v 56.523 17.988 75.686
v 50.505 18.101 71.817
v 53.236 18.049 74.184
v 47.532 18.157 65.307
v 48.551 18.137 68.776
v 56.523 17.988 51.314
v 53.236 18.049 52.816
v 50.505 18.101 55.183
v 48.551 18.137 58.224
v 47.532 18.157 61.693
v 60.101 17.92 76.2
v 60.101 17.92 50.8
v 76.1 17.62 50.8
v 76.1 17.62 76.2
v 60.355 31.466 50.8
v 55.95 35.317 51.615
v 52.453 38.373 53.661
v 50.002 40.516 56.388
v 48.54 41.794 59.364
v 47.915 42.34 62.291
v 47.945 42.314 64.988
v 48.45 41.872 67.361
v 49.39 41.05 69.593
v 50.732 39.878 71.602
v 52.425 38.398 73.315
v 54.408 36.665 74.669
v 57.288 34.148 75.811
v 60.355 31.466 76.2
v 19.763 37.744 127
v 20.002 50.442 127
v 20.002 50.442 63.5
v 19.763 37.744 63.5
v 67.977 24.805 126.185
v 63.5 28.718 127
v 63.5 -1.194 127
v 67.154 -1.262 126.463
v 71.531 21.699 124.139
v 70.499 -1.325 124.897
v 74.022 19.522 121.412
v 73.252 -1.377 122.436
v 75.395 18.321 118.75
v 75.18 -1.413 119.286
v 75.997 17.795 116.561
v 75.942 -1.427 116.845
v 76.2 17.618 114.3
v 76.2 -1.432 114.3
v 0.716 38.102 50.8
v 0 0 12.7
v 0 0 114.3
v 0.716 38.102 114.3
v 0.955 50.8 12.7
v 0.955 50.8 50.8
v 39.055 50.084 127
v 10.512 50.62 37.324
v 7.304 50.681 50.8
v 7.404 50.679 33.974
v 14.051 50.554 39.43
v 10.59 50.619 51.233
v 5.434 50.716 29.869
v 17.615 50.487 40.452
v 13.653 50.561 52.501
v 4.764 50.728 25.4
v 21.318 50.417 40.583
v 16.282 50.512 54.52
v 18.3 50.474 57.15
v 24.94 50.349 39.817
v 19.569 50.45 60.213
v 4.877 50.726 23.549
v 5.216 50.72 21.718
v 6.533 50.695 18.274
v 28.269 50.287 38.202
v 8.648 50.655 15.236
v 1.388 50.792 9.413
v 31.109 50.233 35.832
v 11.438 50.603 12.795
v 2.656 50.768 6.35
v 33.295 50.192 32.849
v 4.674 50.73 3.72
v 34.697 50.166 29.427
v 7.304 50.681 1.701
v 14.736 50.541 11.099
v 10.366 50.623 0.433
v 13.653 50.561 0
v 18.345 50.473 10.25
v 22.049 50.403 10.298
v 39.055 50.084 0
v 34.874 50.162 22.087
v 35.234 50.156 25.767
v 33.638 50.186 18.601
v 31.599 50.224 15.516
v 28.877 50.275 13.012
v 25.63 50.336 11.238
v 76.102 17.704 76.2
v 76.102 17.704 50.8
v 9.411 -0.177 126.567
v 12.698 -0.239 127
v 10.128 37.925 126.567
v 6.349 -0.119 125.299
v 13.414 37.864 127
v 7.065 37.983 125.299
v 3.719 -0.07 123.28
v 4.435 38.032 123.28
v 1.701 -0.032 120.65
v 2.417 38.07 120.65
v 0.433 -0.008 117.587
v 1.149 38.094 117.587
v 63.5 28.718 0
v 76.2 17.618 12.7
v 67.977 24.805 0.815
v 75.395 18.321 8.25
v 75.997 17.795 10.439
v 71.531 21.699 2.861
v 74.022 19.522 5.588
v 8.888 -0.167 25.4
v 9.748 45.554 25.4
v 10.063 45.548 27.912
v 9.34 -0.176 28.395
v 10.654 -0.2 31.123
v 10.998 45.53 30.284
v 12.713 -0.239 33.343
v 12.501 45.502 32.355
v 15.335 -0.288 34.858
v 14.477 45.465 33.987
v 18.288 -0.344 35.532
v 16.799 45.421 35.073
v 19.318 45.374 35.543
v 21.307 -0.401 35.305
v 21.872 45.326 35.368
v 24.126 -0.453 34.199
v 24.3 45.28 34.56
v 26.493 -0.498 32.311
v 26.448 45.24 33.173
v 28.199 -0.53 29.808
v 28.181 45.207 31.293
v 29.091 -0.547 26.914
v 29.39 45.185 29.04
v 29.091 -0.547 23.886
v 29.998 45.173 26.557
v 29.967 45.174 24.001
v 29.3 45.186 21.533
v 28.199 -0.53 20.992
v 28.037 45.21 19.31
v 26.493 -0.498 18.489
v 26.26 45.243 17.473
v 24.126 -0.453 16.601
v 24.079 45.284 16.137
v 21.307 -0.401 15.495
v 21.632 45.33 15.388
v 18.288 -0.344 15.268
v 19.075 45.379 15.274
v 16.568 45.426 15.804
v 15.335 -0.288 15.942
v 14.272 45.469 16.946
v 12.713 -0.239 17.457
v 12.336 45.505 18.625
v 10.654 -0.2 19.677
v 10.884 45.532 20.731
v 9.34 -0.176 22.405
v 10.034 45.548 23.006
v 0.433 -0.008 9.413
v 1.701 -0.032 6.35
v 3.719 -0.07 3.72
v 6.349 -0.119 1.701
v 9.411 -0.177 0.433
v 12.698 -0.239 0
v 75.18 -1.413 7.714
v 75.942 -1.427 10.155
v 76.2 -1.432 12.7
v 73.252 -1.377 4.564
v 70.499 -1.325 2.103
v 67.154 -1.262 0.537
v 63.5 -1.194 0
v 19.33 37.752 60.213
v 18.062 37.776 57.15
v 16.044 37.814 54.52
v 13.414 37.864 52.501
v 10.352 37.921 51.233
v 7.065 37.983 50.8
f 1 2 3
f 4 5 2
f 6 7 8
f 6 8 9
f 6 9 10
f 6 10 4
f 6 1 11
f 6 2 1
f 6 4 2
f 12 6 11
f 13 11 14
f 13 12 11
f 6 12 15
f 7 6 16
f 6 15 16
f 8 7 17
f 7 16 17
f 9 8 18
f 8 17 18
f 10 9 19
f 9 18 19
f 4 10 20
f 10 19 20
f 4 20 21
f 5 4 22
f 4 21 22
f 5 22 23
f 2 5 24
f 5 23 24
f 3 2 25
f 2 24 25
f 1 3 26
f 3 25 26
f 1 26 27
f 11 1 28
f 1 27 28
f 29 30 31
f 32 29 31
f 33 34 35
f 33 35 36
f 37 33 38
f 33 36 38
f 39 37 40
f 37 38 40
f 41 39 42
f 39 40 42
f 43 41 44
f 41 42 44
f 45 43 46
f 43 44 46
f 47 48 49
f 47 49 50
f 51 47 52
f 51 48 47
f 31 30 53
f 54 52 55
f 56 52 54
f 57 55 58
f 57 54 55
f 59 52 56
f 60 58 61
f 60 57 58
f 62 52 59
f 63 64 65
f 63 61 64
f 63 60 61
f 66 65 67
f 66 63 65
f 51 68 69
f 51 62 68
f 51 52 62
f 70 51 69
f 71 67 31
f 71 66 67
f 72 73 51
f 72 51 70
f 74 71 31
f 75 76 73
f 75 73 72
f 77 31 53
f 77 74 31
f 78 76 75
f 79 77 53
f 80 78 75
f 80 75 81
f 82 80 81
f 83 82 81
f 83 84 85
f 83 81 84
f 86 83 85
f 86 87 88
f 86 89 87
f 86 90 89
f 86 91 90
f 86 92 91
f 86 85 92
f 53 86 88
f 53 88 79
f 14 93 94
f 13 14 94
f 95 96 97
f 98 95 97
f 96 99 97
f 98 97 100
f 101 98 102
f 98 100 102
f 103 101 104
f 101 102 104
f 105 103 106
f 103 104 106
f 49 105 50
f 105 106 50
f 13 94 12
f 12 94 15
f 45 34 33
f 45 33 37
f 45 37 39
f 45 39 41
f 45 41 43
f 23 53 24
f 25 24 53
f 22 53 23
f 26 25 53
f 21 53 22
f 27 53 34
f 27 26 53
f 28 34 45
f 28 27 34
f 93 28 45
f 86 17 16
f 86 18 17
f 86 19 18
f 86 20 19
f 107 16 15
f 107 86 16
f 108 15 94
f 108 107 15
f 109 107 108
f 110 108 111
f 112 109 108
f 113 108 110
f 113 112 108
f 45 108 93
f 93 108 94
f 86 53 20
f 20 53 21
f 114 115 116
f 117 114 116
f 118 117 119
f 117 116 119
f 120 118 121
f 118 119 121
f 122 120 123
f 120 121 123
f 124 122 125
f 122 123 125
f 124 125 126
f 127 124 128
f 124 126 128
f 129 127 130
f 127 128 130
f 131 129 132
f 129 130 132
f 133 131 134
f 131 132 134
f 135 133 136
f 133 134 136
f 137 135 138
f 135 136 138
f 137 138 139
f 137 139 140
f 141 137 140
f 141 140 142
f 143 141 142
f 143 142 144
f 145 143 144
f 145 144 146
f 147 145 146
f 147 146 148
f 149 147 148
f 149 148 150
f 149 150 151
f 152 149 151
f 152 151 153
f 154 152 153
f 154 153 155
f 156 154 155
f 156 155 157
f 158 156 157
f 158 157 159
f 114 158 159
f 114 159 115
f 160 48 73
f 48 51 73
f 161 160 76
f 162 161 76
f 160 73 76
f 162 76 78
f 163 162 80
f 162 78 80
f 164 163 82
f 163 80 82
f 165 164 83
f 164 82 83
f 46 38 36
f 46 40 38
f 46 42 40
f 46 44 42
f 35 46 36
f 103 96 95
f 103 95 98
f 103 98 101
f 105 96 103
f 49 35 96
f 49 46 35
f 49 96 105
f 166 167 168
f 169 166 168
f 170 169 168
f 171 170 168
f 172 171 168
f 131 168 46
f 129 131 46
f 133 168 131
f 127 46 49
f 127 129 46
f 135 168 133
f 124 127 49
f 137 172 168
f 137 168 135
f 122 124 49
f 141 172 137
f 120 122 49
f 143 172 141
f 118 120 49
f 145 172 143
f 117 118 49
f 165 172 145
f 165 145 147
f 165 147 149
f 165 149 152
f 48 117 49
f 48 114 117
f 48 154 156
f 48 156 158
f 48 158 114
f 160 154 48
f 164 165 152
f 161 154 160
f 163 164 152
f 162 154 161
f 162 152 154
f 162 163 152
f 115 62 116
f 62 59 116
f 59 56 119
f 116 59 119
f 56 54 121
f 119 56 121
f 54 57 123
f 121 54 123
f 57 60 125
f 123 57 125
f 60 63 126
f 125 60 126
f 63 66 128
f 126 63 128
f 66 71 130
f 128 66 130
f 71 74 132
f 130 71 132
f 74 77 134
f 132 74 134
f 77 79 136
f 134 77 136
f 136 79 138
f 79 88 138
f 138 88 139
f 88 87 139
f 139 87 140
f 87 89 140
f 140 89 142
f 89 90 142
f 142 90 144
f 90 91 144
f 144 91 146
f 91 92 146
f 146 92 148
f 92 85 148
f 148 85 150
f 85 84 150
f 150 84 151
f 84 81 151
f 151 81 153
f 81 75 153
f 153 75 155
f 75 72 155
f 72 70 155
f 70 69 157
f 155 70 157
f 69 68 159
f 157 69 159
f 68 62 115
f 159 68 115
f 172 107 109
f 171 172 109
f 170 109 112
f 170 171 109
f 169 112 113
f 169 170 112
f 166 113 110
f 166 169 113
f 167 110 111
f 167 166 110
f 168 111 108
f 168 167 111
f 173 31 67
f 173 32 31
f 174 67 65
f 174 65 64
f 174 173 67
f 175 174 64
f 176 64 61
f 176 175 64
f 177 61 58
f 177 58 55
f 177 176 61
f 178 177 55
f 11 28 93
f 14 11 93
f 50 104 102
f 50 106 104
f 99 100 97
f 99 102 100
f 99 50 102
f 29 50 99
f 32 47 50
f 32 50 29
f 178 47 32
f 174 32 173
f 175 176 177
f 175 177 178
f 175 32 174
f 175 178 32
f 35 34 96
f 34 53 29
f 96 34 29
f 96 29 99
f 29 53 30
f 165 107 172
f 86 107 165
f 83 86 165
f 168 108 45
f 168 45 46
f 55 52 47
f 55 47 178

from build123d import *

# Parameters (mm, degrees)
BOSS_EXTRUDE1_DEPTH = 127
SKETCH2_R           = 10.16
CUT_EXTRUDE1_DEPTH  = 157.585578439
CHAMFER1_SIZE       = 5.08
SKETCH3_W           = 19.05
SKETCH3_H           = 76.2
CUT_EXTRUDE2_DEPTH  = 12.7
FILLET1_R           = 12.7
CUT_EXTRUDE4_DEPTH  = 31.762338
FILLET2_R           = 12.7
FILLET3_R           = 12.7
FILLET4_R           = 12.7
FILLET5_R           = 12.7


with BuildPart() as part:
    # Sketch1 → Boss-Extrude1 (new body)
    with BuildSketch(Plane.XY):
        Polygon((0, 0), (0.954886233, 50.8), (39.054886233, 50.083835325), (76.2, 17.617670651), (76.2, -1.432329349), align=None)
    extrude(amount=BOSS_EXTRUDE1_DEPTH)

    # Sketch2 → Cut-Extrude1 (cut, through all)
    with BuildSketch(Plane(origin=(0.954886233, 50.8, 0), x_dir=(0.9998233837023289, -0.01879365323787949, 0), z_dir=(0.01879365323787949, 0.999823383702329, 0))):
        with Locations(Location((19.05, -25.4, 0), (0, 0, 180))):
            Circle(SKETCH2_R)
    extrude(amount=-CUT_EXTRUDE1_DEPTH, mode=Mode.SUBTRACT)

    # Chamfer1
    chamfer1_edges = [part.edges().sort_by_distance(p)[0] for p in [
        (30.159727271, 50.251037389, 25.4),
    ]]
    chamfer(chamfer1_edges, length=CHAMFER1_SIZE)

    # Sketch3 → Cut-Extrude2 (cut)
    with BuildSketch(Plane(origin=(0.954886233, 50.8, 0), x_dir=(0.9998233837023289, -0.01879365323787949, 0), z_dir=(0.01879365323787949, 0.999823383702329, 0))):
        with Locations((9.525, -88.9)):
            Rectangle(SKETCH3_W, SKETCH3_H)
    extrude(amount=-CUT_EXTRUDE2_DEPTH, mode=Mode.SUBTRACT)

    # Fillet1
    fillet1_edges = [part.edges().sort_by_distance(p)[0] for p in [
        (19.882181994, 44.093102419, 50.8),
    ]]
    fillet(fillet1_edges, radius=FILLET1_R)

    # Sketch10 → Cut-Extrude4 (cut)
    with BuildSketch(Plane(origin=(0.954886233, 50.8, 0), x_dir=(0.9998233837023289, -0.01879365323787949, 0), z_dir=(0.01879365323787949, 0.999823383702329, 0))):
        with BuildLine():
            Line((75.755441679, -50.8), (59.753441679, -50.8))
            ThreePointArc((59.753441679, -50.8), (47.053441679, -63.5), (59.753441679, -76.2))
            Line((59.753441679, -76.2), (75.755441679, -76.2))
            Line((75.755441679, -76.2), (75.755441679, -50.8))
        make_face()
    extrude(amount=-CUT_EXTRUDE4_DEPTH, mode=Mode.SUBTRACT)

    # Fillet2
    fillet2_edges = [part.edges().sort_by_distance(p)[0] for p in [
        (76.2, 8.092670651, 127),
    ]]
    fillet(fillet2_edges, radius=FILLET2_R)

    # Fillet3
    fillet3_edges = [part.edges().sort_by_distance(p)[0] for p in [
        (0.358103418, 19.051121513, 127),
    ]]
    fillet(fillet3_edges, radius=FILLET3_R)

    # Fillet4
    fillet4_edges = [part.edges().sort_by_distance(p)[0] for p in [
        (0.477443116, 25.4, 0),
    ]]
    fillet(fillet4_edges, radius=FILLET4_R)

    # Fillet5
    fillet5_edges = [part.edges().sort_by_distance(p)[0] for p in [
        (76.2, 8.092670651, 0),
    ]]
    fillet(fillet5_edges, radius=FILLET5_R)


solid = part.part
